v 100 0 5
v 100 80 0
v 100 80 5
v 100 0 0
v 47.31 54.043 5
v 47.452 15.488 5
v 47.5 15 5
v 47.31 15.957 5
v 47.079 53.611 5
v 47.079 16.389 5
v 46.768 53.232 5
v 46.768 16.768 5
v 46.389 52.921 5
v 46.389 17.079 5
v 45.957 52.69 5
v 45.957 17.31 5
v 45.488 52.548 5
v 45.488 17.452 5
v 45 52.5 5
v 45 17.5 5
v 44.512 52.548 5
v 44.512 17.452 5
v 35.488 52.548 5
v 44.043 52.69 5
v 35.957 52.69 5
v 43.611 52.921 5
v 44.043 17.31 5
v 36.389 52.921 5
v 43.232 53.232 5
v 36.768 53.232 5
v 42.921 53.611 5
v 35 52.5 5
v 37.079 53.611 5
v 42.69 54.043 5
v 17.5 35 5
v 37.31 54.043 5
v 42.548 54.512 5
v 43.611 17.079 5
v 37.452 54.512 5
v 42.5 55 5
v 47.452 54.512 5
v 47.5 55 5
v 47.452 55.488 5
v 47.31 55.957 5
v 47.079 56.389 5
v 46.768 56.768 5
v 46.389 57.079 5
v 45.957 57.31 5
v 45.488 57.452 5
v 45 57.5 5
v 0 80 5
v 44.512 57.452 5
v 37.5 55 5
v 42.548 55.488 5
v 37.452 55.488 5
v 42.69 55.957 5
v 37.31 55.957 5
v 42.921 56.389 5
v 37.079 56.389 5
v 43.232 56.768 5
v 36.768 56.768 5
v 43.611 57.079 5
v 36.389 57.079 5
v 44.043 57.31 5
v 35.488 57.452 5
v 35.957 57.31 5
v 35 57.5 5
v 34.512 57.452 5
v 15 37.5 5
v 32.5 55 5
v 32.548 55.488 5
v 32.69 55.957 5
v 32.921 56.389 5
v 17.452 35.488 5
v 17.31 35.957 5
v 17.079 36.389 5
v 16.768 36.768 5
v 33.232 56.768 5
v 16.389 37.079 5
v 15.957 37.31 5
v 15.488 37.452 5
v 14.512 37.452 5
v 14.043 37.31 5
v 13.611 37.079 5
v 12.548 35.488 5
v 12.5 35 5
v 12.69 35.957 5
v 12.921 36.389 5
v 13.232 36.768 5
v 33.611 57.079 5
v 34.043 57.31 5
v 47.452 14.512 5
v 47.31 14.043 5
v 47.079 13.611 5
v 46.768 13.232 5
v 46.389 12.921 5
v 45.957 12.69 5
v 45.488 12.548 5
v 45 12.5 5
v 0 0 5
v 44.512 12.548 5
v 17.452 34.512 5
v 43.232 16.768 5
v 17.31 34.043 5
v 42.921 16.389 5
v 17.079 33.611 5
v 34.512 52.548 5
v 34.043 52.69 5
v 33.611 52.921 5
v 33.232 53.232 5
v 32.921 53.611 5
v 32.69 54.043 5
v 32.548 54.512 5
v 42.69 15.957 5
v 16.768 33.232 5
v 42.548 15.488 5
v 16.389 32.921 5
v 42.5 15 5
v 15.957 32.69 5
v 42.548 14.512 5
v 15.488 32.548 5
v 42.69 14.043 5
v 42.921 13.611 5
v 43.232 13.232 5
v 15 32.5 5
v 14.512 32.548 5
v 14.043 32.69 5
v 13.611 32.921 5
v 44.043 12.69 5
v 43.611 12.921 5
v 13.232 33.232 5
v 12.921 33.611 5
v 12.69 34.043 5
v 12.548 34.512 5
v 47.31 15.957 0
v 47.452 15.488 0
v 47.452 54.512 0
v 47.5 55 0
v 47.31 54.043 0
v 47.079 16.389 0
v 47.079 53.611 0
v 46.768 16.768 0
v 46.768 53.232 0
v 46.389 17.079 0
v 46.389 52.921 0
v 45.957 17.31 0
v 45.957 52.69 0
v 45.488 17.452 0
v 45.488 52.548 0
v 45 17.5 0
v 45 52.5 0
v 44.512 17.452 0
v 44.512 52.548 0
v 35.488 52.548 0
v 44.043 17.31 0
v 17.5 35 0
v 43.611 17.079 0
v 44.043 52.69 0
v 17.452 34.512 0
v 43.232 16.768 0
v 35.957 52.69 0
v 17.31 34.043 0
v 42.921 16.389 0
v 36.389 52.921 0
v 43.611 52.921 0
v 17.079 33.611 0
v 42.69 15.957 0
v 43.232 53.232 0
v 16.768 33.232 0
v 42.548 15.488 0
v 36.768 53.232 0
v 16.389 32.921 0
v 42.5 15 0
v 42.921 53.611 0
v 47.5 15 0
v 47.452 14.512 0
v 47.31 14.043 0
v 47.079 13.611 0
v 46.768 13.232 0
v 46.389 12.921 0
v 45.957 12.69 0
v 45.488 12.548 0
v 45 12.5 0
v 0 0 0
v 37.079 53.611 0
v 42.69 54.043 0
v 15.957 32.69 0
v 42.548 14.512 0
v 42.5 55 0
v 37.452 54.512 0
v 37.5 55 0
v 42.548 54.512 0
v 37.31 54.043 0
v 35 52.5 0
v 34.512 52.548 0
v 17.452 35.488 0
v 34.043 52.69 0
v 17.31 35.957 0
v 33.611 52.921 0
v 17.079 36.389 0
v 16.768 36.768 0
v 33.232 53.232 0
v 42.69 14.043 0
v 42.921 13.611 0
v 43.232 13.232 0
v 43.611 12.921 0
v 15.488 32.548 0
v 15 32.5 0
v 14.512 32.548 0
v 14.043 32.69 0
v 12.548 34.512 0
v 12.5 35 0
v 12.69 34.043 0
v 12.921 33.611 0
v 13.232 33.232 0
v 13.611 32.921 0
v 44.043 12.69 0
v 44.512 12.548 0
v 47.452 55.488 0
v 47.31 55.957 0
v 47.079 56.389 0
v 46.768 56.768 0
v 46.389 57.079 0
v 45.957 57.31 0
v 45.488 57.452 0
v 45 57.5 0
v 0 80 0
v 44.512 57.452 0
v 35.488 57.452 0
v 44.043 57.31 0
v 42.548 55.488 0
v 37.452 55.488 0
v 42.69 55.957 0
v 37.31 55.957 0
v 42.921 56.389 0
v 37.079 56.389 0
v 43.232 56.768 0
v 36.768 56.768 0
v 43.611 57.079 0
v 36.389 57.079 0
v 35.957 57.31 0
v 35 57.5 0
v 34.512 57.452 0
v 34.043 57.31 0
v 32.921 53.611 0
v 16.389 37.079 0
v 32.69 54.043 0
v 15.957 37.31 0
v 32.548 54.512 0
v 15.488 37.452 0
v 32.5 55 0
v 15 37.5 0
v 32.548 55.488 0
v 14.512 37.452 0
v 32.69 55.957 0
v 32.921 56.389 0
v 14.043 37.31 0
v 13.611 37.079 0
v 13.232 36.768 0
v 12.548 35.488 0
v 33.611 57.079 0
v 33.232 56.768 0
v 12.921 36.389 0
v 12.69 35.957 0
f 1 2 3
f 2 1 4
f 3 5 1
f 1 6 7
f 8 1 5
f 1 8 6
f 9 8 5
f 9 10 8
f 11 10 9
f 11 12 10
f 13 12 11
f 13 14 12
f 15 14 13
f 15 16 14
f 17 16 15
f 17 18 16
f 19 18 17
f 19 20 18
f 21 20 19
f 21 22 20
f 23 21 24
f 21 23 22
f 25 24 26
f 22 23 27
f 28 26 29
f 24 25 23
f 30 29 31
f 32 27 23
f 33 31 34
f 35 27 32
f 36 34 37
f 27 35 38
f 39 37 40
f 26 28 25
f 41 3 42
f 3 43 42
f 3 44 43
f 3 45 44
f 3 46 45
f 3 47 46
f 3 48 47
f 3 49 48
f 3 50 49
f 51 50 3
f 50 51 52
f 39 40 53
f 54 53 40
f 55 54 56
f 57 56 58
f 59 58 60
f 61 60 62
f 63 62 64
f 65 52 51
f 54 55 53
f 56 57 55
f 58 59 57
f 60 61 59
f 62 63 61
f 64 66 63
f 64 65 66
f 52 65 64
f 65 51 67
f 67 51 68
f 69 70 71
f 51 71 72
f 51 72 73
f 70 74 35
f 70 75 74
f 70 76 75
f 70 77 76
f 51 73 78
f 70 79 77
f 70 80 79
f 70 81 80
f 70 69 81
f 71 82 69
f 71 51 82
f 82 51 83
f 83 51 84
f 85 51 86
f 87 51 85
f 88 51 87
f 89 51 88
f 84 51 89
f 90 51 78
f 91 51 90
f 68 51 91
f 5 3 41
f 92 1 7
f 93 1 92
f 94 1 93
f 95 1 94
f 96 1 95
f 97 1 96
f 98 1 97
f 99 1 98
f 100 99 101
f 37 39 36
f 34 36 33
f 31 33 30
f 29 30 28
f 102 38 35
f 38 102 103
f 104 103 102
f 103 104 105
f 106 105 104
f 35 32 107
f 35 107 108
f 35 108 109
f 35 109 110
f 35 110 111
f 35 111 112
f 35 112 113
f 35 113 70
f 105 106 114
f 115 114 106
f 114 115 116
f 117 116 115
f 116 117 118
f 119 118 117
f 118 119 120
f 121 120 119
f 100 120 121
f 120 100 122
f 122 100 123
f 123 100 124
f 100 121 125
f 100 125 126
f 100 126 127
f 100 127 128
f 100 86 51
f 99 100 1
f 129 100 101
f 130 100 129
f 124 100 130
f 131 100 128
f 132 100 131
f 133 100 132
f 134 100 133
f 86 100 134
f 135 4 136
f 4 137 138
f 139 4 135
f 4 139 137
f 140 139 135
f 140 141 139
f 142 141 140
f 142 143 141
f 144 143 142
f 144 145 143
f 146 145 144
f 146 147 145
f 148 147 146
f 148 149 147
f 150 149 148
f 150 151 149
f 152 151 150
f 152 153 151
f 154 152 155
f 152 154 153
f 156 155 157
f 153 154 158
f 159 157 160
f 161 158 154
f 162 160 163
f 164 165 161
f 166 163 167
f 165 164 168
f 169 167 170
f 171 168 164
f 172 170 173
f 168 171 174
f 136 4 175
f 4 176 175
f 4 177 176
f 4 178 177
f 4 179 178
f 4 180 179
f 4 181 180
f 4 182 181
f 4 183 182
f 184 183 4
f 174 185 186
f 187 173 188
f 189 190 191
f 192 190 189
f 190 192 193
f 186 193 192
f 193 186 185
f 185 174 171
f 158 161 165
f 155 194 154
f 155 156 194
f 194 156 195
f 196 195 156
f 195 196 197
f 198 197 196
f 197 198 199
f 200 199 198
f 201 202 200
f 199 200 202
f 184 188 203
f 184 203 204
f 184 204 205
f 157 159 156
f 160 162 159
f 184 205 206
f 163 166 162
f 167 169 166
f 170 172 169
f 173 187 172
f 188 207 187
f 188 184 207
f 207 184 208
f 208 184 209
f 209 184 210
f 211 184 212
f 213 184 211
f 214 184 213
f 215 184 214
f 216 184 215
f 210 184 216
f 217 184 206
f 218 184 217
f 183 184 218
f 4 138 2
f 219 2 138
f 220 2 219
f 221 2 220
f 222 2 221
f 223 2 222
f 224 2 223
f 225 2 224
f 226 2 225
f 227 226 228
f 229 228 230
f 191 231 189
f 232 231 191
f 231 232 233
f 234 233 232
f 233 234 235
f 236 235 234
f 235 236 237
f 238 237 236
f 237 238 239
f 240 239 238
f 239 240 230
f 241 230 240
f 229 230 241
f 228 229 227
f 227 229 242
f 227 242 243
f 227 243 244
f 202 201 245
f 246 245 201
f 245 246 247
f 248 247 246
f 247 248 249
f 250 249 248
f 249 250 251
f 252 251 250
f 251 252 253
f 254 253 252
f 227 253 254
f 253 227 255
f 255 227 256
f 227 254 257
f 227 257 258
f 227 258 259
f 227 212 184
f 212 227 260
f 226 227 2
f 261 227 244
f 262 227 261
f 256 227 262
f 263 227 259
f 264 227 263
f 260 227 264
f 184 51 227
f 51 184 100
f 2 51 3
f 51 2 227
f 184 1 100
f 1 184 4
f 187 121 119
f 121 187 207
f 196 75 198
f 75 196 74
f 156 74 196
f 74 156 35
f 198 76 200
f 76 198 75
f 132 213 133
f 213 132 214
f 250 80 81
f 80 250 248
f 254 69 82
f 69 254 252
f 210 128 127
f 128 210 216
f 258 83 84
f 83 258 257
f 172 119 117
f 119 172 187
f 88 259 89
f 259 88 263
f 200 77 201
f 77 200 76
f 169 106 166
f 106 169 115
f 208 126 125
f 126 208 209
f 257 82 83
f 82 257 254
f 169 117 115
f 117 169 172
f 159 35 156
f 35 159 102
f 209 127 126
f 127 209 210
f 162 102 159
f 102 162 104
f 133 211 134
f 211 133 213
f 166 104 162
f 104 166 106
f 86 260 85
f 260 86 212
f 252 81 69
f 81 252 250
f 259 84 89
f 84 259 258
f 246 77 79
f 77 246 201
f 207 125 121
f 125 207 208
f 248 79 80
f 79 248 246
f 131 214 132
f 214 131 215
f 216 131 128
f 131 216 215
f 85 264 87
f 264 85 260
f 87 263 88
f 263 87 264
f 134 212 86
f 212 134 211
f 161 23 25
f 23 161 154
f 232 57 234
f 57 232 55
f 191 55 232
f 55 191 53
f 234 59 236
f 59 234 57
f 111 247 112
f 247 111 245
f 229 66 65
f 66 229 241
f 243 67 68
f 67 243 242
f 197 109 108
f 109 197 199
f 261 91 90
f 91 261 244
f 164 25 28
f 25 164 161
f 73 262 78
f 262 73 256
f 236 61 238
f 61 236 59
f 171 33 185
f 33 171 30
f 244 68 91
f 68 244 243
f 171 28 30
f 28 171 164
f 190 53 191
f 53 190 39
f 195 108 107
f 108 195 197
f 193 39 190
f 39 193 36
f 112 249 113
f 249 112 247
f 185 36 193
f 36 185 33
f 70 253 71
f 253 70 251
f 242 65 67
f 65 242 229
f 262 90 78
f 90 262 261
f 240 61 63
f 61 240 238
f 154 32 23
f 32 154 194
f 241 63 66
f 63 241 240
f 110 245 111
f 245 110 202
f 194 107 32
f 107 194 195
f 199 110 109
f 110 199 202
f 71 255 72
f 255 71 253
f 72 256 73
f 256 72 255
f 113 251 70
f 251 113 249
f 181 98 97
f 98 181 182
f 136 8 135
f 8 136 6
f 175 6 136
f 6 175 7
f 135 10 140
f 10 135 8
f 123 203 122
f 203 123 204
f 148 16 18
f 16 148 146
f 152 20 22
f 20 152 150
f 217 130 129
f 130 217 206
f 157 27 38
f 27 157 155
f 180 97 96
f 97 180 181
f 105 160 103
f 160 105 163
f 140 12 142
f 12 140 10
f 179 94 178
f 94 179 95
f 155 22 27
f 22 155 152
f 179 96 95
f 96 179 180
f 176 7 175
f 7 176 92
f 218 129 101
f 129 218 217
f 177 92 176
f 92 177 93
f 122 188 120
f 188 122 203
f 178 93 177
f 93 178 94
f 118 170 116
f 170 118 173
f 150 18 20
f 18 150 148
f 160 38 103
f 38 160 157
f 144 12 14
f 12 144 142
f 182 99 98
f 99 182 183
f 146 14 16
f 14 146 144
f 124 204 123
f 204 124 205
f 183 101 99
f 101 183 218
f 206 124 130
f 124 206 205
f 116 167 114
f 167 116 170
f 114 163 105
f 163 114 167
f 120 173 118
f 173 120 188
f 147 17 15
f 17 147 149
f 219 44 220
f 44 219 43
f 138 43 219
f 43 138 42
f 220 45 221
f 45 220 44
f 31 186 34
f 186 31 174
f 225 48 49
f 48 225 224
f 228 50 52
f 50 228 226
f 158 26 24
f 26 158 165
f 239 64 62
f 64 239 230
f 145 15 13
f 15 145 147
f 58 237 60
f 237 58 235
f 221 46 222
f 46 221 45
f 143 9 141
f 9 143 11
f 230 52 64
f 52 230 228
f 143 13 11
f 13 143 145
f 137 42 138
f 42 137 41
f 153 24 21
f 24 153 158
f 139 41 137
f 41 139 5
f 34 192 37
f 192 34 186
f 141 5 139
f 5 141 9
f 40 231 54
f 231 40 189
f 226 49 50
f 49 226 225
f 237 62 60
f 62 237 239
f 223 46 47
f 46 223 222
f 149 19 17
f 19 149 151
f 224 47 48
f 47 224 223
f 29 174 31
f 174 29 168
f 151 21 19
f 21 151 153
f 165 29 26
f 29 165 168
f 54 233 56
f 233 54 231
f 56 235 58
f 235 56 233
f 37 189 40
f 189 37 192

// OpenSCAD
$fn = 32;

// ----------------------------------------------------------------------
// Hole field: plate with holes at given coordinates
// ----------------------------------------------------------------------

// --- parameters (mm) ---
plate_l = 100;            // plate length, X
plate_w = 80;             // plate width, Y
plate_t = 5;              // plate thickness, Z
hole_d = 5;               // hole diameter

difference() {
  cube([plate_l, plate_w, plate_t]);
  translate([15, 35, -1]) cylinder(h = plate_t + 2, d = hole_d);
  translate([35, 55, -1]) cylinder(h = plate_t + 2, d = hole_d);
  translate([45, 15, -1]) cylinder(h = plate_t + 2, d = hole_d);
  translate([45, 55, -1]) cylinder(h = plate_t + 2, d = hole_d);
}
